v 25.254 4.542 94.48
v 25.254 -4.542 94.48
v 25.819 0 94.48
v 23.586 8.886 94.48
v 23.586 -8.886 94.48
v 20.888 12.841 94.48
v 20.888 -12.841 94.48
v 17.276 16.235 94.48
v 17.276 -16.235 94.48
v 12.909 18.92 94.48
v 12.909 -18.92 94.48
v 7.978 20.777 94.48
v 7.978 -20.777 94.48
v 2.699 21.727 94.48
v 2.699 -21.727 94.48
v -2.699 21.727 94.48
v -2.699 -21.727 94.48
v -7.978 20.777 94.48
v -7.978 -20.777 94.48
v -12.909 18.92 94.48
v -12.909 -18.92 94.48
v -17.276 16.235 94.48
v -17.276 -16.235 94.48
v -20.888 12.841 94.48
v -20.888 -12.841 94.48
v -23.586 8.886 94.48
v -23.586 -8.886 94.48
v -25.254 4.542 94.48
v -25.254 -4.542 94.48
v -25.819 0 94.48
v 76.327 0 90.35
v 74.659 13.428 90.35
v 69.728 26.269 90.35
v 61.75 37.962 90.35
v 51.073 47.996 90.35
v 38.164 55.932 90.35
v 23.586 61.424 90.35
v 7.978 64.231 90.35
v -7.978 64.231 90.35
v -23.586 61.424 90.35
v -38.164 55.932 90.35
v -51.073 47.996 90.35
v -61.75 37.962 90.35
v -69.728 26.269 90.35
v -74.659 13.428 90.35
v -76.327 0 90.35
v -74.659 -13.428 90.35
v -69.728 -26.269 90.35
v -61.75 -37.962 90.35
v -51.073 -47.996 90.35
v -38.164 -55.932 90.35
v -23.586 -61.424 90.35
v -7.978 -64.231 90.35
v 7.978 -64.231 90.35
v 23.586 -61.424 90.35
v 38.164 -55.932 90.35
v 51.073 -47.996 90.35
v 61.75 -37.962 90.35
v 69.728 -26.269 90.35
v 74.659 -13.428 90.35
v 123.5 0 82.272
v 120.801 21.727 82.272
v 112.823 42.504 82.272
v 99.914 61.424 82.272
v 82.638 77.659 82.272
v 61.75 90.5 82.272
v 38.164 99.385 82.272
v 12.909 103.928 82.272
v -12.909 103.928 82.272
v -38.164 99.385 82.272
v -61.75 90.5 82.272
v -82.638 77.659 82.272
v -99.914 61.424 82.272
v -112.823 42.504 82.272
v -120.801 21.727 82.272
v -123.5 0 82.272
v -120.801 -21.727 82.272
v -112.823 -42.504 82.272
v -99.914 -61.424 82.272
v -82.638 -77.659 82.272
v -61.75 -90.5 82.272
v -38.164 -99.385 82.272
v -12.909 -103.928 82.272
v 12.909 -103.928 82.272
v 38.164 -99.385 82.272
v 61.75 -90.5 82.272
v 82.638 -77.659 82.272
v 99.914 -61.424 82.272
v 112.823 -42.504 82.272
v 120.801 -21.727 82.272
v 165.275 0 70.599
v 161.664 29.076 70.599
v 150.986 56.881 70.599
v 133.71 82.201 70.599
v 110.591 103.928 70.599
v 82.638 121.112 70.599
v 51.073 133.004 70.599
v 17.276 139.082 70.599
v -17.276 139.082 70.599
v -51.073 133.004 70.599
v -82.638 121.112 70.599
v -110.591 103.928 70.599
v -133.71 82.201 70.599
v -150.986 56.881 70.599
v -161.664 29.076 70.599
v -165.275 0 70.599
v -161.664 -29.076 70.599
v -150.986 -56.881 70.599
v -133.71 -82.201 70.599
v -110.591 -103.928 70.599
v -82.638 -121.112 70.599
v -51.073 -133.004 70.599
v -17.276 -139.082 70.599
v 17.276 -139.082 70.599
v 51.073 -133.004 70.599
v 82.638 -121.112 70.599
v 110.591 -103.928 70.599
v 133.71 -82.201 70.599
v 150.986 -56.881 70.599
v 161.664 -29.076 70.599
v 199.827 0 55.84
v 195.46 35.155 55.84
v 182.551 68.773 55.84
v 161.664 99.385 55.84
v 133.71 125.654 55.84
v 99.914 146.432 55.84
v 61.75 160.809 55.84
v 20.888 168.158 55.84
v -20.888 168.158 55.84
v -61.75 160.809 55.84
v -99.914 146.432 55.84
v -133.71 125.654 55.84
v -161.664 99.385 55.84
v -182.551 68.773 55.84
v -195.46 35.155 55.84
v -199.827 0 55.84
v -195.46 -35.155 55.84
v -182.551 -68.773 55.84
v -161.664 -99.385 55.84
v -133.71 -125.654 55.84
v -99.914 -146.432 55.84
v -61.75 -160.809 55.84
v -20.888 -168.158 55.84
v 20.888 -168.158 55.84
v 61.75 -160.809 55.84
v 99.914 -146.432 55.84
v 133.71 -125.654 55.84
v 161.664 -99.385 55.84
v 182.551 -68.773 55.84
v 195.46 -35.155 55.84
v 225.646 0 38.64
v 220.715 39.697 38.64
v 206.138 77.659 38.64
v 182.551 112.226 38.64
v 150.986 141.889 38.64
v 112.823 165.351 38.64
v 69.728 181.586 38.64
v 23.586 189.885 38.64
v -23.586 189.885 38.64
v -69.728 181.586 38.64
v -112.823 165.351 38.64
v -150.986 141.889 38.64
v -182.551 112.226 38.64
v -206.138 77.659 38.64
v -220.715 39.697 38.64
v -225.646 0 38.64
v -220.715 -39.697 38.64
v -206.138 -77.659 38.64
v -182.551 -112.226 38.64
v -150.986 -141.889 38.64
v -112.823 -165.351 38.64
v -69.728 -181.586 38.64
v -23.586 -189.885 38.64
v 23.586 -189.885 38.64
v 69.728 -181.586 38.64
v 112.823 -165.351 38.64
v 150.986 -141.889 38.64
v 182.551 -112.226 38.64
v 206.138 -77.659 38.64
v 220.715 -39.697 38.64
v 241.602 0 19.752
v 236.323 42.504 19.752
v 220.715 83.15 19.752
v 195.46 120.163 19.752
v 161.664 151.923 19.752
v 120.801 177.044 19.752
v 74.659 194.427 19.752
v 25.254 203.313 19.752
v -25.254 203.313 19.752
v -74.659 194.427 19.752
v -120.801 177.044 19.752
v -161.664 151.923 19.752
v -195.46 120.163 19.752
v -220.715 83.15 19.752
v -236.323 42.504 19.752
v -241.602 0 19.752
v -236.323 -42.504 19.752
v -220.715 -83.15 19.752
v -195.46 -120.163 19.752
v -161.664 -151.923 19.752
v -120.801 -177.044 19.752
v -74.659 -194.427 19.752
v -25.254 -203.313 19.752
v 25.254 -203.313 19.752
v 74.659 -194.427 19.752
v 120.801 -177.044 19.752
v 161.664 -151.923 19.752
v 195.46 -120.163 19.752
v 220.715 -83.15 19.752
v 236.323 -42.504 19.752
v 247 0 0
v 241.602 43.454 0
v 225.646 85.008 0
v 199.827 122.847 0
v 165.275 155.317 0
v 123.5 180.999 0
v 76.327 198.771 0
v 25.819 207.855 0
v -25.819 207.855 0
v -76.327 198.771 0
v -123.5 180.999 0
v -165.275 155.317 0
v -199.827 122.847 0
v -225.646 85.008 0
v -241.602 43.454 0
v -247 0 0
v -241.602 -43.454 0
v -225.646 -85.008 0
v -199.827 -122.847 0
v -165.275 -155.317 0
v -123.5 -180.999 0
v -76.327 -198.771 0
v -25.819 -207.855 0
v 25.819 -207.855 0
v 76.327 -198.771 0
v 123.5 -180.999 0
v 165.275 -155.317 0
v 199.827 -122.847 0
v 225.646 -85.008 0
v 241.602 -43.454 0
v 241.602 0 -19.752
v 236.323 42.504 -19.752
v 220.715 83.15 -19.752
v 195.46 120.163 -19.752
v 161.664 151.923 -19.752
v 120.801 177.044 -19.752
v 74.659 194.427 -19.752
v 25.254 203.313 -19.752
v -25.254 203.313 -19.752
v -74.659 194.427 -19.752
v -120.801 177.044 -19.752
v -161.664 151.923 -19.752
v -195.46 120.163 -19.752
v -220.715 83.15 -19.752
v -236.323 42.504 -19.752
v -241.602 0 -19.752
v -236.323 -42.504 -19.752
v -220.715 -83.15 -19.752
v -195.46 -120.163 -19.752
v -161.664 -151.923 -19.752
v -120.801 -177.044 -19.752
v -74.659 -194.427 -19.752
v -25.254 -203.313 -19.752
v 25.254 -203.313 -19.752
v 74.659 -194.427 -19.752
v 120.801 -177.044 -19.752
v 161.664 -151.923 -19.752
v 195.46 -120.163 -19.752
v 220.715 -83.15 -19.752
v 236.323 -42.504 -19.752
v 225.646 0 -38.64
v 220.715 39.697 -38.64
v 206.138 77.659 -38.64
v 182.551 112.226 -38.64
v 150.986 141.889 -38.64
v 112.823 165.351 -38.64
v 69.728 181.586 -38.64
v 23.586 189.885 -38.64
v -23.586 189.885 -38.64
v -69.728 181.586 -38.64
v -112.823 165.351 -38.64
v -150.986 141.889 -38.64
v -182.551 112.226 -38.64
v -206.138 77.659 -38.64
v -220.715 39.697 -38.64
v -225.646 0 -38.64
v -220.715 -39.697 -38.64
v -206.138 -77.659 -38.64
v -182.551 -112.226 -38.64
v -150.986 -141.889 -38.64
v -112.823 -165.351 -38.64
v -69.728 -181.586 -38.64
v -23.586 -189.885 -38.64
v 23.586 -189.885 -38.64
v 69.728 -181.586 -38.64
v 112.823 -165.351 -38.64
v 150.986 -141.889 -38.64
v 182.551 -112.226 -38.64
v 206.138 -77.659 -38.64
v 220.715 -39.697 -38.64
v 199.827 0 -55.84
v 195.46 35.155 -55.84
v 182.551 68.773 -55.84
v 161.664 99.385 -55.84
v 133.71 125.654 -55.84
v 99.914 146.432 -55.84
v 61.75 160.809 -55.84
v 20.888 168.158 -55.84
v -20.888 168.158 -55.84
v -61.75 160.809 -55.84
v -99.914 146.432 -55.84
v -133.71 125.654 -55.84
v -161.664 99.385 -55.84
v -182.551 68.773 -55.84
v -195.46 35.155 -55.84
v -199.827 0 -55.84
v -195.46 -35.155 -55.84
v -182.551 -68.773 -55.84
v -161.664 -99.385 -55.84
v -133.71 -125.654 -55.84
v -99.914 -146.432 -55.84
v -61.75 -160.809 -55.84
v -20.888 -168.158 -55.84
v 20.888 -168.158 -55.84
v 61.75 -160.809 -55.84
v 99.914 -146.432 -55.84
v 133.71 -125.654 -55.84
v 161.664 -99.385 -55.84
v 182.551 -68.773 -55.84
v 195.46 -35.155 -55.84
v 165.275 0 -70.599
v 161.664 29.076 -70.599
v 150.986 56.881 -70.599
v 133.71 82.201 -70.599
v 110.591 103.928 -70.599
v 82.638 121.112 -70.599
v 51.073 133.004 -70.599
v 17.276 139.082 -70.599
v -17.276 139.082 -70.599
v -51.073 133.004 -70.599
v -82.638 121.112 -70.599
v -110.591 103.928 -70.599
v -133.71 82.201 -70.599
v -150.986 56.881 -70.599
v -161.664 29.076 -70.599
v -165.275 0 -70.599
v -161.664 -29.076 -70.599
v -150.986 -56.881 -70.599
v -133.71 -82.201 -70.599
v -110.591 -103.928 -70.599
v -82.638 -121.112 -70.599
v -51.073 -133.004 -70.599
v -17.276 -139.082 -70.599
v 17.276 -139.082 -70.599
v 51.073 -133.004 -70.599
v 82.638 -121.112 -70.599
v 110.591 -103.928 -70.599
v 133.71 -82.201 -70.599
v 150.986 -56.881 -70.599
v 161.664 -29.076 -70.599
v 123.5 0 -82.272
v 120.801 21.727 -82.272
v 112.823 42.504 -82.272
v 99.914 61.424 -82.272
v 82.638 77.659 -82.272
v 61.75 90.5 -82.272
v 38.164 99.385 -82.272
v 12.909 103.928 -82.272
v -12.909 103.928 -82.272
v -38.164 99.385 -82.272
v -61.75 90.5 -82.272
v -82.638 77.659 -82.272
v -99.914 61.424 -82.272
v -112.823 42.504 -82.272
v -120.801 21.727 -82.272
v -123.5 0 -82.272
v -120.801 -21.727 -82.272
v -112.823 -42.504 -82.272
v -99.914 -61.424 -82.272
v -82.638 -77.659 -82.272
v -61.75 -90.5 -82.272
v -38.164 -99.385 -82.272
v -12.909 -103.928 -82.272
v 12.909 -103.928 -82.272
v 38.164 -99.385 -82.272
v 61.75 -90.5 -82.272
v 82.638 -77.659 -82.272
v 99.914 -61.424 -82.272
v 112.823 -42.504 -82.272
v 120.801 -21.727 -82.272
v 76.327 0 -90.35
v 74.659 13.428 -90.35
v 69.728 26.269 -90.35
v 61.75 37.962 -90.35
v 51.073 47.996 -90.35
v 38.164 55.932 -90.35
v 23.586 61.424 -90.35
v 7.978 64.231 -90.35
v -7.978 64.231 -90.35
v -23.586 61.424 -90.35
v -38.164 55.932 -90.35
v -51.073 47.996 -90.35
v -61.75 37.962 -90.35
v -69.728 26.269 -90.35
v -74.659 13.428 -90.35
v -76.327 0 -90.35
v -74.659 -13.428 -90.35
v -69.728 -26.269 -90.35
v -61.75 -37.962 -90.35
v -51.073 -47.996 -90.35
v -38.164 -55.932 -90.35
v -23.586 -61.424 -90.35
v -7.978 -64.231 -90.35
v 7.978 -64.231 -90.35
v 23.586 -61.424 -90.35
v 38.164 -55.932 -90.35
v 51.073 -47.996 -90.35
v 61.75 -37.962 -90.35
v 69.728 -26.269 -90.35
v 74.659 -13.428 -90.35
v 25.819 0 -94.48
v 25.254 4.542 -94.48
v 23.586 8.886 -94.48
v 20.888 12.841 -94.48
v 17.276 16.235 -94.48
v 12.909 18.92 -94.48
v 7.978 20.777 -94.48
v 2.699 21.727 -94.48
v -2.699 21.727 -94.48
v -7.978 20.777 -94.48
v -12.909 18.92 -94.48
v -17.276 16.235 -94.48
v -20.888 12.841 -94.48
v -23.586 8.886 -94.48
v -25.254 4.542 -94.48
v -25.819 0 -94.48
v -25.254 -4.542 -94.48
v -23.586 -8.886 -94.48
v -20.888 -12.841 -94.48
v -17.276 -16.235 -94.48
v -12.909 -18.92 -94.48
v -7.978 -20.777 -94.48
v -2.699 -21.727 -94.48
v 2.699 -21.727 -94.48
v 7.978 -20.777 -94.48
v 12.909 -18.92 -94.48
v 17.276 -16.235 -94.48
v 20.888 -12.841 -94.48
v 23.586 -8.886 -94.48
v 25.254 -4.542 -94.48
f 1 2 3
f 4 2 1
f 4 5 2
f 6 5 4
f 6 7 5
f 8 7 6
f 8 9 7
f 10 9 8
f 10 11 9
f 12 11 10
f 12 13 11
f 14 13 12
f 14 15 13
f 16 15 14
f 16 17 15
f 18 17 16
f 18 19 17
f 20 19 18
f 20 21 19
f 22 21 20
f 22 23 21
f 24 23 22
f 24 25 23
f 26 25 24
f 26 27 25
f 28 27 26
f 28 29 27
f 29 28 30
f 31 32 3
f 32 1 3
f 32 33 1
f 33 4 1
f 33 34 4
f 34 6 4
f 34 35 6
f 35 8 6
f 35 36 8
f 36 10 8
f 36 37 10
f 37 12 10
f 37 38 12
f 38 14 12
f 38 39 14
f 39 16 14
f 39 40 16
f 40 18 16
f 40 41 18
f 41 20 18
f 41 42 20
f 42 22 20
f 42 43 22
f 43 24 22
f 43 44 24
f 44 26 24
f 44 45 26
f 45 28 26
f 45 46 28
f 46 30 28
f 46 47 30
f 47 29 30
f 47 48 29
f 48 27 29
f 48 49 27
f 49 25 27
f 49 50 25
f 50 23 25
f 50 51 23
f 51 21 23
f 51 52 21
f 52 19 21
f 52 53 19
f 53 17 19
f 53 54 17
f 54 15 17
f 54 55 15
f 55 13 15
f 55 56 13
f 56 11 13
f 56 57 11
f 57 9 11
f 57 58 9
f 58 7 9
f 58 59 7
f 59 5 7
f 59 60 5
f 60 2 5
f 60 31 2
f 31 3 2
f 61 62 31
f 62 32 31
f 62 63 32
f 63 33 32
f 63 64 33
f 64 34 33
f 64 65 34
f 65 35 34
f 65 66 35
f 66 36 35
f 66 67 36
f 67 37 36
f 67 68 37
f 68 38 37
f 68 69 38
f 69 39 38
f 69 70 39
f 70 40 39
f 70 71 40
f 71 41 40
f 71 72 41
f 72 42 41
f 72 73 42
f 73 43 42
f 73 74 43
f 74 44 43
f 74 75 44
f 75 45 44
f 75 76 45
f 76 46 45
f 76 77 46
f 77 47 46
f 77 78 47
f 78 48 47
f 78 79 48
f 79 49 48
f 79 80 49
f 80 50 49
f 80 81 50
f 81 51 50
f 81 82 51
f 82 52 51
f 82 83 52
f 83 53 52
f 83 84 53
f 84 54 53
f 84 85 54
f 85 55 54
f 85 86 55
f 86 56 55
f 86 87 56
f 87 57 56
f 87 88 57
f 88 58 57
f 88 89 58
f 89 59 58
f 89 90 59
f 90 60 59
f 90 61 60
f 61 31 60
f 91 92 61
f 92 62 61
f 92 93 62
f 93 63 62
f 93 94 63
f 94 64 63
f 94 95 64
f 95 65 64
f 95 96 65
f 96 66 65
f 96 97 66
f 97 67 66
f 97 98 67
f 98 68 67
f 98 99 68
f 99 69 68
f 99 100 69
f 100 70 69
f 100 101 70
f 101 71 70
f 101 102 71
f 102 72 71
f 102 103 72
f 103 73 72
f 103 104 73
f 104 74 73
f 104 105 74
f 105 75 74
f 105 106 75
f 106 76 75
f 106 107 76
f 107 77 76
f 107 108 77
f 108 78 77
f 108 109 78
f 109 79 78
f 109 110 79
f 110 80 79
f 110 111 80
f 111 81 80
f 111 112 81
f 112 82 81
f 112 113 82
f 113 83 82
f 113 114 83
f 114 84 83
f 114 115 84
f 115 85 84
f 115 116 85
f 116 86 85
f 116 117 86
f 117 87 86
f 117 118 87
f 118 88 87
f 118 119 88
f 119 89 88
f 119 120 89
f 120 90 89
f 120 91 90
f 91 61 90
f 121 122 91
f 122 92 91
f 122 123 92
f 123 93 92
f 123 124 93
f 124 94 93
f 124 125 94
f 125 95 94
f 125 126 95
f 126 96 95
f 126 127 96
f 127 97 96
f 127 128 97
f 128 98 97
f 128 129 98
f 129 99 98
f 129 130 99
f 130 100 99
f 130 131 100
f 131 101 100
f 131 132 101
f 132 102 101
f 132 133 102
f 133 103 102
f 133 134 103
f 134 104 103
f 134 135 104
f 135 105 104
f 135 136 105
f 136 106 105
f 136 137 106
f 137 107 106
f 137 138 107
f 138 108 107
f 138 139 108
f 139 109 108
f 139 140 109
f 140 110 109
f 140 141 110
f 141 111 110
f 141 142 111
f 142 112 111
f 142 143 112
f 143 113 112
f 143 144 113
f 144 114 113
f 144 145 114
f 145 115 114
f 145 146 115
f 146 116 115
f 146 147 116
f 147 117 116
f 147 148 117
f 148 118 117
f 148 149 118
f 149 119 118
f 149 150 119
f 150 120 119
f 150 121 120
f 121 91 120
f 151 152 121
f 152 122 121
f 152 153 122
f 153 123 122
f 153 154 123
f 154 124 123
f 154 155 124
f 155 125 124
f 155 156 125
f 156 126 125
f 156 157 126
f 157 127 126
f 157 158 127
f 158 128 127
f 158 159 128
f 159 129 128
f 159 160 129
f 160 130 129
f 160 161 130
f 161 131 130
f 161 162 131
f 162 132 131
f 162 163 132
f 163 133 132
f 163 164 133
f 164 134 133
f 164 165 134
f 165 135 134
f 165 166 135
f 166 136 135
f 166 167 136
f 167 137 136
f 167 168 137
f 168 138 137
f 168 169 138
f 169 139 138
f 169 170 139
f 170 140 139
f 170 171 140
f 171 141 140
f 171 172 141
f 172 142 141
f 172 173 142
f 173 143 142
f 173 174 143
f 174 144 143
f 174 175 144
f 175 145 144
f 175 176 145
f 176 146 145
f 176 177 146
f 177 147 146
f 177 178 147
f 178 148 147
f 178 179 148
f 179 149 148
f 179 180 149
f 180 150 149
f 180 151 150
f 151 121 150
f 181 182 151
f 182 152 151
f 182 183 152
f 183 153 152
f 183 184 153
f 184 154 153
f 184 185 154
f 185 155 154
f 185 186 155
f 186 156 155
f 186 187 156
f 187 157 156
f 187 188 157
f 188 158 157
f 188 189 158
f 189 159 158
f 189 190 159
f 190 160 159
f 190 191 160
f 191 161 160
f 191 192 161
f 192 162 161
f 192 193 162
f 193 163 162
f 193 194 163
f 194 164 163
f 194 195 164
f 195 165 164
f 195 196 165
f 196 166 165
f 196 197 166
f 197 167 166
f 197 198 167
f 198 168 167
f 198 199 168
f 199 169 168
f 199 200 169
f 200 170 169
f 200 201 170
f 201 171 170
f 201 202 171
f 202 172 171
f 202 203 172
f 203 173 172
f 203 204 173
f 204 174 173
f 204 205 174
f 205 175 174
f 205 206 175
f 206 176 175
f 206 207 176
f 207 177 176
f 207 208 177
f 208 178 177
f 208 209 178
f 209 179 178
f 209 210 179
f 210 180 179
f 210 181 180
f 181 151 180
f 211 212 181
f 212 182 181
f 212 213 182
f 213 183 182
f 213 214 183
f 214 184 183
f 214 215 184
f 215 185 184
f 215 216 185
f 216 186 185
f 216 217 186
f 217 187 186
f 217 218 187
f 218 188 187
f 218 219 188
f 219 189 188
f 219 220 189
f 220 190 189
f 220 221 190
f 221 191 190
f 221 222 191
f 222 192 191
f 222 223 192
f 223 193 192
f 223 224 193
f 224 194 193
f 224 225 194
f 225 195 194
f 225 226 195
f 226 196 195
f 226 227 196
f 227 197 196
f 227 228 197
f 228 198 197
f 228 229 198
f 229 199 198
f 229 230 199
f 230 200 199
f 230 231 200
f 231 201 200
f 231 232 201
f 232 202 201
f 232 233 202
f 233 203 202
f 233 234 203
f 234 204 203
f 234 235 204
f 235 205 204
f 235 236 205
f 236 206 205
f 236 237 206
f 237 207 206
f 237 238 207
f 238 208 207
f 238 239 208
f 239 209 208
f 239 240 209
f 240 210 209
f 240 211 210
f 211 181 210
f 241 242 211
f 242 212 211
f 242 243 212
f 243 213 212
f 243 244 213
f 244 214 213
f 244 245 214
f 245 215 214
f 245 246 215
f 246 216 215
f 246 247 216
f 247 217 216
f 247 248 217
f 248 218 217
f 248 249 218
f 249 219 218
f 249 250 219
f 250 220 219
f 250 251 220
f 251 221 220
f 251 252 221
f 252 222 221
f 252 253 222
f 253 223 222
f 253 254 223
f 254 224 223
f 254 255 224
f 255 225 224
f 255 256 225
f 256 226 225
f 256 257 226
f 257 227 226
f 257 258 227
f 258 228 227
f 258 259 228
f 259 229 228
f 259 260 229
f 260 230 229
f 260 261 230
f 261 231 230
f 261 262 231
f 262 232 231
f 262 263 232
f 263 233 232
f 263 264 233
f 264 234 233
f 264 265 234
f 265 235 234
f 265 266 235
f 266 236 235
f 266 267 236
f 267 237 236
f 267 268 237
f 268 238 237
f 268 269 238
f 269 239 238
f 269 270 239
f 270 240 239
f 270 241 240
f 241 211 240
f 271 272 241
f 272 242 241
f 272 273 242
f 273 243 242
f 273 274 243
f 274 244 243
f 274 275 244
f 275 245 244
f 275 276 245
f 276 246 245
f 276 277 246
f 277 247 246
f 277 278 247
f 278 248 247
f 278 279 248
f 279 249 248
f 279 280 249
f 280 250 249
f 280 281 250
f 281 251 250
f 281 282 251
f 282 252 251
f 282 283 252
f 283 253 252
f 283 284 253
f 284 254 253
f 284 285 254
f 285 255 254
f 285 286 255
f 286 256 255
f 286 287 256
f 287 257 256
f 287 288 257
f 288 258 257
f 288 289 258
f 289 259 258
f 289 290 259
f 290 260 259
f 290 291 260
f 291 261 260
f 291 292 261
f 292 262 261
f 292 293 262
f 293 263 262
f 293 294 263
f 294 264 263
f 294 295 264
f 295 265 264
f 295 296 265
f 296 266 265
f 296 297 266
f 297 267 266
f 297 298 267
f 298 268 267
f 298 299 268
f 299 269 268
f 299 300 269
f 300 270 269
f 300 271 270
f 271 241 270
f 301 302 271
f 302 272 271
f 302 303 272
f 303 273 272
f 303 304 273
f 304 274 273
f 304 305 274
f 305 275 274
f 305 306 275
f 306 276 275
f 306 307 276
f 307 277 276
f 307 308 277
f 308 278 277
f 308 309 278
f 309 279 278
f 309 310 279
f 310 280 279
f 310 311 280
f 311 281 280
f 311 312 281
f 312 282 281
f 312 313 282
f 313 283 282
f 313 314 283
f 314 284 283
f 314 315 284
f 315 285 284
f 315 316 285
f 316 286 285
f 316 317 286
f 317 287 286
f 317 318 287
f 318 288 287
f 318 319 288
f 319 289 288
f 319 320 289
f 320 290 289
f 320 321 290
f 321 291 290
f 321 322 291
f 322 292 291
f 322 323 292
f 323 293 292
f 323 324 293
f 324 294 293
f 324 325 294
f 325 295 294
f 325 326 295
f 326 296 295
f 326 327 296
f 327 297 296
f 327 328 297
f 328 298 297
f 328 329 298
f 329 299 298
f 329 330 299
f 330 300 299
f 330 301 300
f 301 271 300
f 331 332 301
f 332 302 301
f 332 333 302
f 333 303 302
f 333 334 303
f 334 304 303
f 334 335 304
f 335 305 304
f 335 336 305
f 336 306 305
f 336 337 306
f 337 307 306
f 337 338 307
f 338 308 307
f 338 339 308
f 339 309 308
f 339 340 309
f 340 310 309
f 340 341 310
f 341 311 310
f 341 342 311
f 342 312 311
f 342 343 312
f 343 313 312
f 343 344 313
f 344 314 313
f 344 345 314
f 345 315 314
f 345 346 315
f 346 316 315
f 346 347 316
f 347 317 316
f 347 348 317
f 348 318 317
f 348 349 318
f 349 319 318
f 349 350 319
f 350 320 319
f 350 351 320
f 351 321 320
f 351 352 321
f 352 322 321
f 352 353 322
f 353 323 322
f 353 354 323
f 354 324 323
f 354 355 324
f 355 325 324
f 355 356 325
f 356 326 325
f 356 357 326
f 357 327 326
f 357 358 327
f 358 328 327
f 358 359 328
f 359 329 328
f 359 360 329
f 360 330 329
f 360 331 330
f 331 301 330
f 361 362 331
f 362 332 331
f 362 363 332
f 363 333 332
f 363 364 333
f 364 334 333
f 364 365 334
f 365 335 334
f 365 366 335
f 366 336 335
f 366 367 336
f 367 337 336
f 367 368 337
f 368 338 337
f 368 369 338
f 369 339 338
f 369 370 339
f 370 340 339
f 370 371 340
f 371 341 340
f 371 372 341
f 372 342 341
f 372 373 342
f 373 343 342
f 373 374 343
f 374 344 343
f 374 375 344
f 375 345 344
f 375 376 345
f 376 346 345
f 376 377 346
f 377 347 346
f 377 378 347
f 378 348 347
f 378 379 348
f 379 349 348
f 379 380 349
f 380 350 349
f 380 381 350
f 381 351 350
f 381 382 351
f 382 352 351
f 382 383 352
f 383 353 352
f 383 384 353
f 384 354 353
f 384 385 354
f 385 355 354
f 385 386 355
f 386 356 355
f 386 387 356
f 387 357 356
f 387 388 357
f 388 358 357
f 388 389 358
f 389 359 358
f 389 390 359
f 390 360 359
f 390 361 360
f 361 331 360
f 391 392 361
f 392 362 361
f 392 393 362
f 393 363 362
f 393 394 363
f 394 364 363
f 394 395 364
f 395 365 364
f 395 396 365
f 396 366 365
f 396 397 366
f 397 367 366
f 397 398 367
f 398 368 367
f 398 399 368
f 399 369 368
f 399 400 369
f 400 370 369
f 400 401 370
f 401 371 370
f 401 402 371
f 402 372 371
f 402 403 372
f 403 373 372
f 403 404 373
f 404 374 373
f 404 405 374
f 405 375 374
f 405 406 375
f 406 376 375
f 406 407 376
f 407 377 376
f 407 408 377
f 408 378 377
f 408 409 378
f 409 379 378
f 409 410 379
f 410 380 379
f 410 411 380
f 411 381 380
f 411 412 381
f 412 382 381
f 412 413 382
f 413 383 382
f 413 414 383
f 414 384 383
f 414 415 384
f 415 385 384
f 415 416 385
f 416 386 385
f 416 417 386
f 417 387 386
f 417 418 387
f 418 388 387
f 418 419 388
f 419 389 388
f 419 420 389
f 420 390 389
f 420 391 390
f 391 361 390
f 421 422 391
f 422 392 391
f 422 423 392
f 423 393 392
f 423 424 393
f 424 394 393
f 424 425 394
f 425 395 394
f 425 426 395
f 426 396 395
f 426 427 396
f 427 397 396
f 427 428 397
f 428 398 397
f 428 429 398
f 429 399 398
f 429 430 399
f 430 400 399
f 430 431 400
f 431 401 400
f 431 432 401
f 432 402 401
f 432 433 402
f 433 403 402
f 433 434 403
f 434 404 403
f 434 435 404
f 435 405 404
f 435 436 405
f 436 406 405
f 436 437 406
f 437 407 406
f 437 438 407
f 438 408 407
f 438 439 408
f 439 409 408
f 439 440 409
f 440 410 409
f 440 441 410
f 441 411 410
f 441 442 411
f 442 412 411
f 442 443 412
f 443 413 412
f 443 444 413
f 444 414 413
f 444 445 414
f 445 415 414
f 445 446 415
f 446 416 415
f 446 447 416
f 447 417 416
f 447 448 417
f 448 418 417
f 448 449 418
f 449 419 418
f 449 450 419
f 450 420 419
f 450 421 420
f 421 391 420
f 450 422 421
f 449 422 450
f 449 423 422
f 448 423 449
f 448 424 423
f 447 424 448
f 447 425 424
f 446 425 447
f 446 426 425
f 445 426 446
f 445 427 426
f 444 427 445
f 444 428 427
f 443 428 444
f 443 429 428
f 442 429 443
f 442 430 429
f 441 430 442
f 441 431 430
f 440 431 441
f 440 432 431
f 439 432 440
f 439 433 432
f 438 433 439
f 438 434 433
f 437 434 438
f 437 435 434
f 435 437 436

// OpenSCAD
// Generated by SolidPython 1.0.1 on 2020-07-29 00:46:50


scale(v = [13, 11, 5]) {
	sphere(r = 19);
}
/***********************************************
*********      SolidPython code:      **********
************************************************
 
# import packages: SolidPython
from solid import *
from solid.utils import *
from itertools import chain, combinations, permutations


class Resize:

    def __init__(self, scad_file):
        self.scad_file = scad_file
        #self.scad_file = import_scad(scad_file)
        # cone/cylinder param:
        self.r1 = 0
        self.r2 = 0
        self.h = 0
        # rectangular prism param:
        self.w = 0
        self.l = 0
        # ellipse param:
        self.r = 0

    # import OpenScad code (file name corresponds to shape)


    # classify shape + parameters
    def assign(self, param1, param2, param3):
        if self.scad_file == 'cone.scad':
            self.r1 = param1
            self.r2 = param2
            self.h = param3
        elif self.scad_file == 'cylinder.scad':
            self.r1 = param1
            self.r2 = param2
            self.h = param3
        elif self.scad_file == 'rectangularPrism.scad':
            self.h = param1
            self.l = param2
            self.w = param3
        else:
            self.r = param1
            self.h = param2

    # resize parameters
    def iterate(self):
        x = range(3, 20, 2)
        i = 1
        if self.scad_file == 'cone.scad':
            tempList = list(permutations(x, 2))
            for temp in tempList:
                param1 = temp[0]
                param2 = temp[1]
                filepath = 'produced_scad_files/' + 'cone' + str(param1) + '_' + str(param2) + '_' + '.scad'
                scad_render_to_file(cylinder(h=param1, r1=param2, r2=0), filepath)

        elif self.scad_file == 'cylinder.scad':
            tempList = list(permutations(x, 3))
            for temp in tempList:
                param1 = temp[0]
                param2 = temp[1]
                filepath = 'produced_scad_files/' + 'cylinder' + str(param1) + '_' + str(param2) + '_' + '.scad'
                scad_render_to_file(cylinder(h=param1, r1=param2, r2=param2), filepath)

        elif self.scad_file == 'rectangularPrism.scad':
            tempList = list(permutations(x, 3))
            for temp in tempList:
                param1 = temp[0]
                param2 = temp[1]
                param3 = temp[2]
                filepath = 'produced_scad_files/' + 'rectangularPrism' + str(param1) + '_' + str(param2) + '_' + str(
                    param3) + '.scad'
                scad_render_to_file(cube(size=(param1, param2, param3)), filepath)

        elif self.scad_file == 'ellipse.scad':
            tempList = list(permutations(x, 4))
            for temp in tempList:
                param1 = temp[0]
                param2 = temp[1]
                param3 = temp[2]
                param4 = temp[3]
                filepath = 'produced_scad_files/' + 'ellipse' + str(param1) + '_' + str(param2) + '_' + str(param3) + '_' + str(param4) + '.scad'
                scad_render_to_file(scale([param1, param2, param3])(sphere(r=param4)), filepath)

    def render_to_scadfile(self):
        scad_render_to_file(scad, 'example.scad') 
 
************************************************/
